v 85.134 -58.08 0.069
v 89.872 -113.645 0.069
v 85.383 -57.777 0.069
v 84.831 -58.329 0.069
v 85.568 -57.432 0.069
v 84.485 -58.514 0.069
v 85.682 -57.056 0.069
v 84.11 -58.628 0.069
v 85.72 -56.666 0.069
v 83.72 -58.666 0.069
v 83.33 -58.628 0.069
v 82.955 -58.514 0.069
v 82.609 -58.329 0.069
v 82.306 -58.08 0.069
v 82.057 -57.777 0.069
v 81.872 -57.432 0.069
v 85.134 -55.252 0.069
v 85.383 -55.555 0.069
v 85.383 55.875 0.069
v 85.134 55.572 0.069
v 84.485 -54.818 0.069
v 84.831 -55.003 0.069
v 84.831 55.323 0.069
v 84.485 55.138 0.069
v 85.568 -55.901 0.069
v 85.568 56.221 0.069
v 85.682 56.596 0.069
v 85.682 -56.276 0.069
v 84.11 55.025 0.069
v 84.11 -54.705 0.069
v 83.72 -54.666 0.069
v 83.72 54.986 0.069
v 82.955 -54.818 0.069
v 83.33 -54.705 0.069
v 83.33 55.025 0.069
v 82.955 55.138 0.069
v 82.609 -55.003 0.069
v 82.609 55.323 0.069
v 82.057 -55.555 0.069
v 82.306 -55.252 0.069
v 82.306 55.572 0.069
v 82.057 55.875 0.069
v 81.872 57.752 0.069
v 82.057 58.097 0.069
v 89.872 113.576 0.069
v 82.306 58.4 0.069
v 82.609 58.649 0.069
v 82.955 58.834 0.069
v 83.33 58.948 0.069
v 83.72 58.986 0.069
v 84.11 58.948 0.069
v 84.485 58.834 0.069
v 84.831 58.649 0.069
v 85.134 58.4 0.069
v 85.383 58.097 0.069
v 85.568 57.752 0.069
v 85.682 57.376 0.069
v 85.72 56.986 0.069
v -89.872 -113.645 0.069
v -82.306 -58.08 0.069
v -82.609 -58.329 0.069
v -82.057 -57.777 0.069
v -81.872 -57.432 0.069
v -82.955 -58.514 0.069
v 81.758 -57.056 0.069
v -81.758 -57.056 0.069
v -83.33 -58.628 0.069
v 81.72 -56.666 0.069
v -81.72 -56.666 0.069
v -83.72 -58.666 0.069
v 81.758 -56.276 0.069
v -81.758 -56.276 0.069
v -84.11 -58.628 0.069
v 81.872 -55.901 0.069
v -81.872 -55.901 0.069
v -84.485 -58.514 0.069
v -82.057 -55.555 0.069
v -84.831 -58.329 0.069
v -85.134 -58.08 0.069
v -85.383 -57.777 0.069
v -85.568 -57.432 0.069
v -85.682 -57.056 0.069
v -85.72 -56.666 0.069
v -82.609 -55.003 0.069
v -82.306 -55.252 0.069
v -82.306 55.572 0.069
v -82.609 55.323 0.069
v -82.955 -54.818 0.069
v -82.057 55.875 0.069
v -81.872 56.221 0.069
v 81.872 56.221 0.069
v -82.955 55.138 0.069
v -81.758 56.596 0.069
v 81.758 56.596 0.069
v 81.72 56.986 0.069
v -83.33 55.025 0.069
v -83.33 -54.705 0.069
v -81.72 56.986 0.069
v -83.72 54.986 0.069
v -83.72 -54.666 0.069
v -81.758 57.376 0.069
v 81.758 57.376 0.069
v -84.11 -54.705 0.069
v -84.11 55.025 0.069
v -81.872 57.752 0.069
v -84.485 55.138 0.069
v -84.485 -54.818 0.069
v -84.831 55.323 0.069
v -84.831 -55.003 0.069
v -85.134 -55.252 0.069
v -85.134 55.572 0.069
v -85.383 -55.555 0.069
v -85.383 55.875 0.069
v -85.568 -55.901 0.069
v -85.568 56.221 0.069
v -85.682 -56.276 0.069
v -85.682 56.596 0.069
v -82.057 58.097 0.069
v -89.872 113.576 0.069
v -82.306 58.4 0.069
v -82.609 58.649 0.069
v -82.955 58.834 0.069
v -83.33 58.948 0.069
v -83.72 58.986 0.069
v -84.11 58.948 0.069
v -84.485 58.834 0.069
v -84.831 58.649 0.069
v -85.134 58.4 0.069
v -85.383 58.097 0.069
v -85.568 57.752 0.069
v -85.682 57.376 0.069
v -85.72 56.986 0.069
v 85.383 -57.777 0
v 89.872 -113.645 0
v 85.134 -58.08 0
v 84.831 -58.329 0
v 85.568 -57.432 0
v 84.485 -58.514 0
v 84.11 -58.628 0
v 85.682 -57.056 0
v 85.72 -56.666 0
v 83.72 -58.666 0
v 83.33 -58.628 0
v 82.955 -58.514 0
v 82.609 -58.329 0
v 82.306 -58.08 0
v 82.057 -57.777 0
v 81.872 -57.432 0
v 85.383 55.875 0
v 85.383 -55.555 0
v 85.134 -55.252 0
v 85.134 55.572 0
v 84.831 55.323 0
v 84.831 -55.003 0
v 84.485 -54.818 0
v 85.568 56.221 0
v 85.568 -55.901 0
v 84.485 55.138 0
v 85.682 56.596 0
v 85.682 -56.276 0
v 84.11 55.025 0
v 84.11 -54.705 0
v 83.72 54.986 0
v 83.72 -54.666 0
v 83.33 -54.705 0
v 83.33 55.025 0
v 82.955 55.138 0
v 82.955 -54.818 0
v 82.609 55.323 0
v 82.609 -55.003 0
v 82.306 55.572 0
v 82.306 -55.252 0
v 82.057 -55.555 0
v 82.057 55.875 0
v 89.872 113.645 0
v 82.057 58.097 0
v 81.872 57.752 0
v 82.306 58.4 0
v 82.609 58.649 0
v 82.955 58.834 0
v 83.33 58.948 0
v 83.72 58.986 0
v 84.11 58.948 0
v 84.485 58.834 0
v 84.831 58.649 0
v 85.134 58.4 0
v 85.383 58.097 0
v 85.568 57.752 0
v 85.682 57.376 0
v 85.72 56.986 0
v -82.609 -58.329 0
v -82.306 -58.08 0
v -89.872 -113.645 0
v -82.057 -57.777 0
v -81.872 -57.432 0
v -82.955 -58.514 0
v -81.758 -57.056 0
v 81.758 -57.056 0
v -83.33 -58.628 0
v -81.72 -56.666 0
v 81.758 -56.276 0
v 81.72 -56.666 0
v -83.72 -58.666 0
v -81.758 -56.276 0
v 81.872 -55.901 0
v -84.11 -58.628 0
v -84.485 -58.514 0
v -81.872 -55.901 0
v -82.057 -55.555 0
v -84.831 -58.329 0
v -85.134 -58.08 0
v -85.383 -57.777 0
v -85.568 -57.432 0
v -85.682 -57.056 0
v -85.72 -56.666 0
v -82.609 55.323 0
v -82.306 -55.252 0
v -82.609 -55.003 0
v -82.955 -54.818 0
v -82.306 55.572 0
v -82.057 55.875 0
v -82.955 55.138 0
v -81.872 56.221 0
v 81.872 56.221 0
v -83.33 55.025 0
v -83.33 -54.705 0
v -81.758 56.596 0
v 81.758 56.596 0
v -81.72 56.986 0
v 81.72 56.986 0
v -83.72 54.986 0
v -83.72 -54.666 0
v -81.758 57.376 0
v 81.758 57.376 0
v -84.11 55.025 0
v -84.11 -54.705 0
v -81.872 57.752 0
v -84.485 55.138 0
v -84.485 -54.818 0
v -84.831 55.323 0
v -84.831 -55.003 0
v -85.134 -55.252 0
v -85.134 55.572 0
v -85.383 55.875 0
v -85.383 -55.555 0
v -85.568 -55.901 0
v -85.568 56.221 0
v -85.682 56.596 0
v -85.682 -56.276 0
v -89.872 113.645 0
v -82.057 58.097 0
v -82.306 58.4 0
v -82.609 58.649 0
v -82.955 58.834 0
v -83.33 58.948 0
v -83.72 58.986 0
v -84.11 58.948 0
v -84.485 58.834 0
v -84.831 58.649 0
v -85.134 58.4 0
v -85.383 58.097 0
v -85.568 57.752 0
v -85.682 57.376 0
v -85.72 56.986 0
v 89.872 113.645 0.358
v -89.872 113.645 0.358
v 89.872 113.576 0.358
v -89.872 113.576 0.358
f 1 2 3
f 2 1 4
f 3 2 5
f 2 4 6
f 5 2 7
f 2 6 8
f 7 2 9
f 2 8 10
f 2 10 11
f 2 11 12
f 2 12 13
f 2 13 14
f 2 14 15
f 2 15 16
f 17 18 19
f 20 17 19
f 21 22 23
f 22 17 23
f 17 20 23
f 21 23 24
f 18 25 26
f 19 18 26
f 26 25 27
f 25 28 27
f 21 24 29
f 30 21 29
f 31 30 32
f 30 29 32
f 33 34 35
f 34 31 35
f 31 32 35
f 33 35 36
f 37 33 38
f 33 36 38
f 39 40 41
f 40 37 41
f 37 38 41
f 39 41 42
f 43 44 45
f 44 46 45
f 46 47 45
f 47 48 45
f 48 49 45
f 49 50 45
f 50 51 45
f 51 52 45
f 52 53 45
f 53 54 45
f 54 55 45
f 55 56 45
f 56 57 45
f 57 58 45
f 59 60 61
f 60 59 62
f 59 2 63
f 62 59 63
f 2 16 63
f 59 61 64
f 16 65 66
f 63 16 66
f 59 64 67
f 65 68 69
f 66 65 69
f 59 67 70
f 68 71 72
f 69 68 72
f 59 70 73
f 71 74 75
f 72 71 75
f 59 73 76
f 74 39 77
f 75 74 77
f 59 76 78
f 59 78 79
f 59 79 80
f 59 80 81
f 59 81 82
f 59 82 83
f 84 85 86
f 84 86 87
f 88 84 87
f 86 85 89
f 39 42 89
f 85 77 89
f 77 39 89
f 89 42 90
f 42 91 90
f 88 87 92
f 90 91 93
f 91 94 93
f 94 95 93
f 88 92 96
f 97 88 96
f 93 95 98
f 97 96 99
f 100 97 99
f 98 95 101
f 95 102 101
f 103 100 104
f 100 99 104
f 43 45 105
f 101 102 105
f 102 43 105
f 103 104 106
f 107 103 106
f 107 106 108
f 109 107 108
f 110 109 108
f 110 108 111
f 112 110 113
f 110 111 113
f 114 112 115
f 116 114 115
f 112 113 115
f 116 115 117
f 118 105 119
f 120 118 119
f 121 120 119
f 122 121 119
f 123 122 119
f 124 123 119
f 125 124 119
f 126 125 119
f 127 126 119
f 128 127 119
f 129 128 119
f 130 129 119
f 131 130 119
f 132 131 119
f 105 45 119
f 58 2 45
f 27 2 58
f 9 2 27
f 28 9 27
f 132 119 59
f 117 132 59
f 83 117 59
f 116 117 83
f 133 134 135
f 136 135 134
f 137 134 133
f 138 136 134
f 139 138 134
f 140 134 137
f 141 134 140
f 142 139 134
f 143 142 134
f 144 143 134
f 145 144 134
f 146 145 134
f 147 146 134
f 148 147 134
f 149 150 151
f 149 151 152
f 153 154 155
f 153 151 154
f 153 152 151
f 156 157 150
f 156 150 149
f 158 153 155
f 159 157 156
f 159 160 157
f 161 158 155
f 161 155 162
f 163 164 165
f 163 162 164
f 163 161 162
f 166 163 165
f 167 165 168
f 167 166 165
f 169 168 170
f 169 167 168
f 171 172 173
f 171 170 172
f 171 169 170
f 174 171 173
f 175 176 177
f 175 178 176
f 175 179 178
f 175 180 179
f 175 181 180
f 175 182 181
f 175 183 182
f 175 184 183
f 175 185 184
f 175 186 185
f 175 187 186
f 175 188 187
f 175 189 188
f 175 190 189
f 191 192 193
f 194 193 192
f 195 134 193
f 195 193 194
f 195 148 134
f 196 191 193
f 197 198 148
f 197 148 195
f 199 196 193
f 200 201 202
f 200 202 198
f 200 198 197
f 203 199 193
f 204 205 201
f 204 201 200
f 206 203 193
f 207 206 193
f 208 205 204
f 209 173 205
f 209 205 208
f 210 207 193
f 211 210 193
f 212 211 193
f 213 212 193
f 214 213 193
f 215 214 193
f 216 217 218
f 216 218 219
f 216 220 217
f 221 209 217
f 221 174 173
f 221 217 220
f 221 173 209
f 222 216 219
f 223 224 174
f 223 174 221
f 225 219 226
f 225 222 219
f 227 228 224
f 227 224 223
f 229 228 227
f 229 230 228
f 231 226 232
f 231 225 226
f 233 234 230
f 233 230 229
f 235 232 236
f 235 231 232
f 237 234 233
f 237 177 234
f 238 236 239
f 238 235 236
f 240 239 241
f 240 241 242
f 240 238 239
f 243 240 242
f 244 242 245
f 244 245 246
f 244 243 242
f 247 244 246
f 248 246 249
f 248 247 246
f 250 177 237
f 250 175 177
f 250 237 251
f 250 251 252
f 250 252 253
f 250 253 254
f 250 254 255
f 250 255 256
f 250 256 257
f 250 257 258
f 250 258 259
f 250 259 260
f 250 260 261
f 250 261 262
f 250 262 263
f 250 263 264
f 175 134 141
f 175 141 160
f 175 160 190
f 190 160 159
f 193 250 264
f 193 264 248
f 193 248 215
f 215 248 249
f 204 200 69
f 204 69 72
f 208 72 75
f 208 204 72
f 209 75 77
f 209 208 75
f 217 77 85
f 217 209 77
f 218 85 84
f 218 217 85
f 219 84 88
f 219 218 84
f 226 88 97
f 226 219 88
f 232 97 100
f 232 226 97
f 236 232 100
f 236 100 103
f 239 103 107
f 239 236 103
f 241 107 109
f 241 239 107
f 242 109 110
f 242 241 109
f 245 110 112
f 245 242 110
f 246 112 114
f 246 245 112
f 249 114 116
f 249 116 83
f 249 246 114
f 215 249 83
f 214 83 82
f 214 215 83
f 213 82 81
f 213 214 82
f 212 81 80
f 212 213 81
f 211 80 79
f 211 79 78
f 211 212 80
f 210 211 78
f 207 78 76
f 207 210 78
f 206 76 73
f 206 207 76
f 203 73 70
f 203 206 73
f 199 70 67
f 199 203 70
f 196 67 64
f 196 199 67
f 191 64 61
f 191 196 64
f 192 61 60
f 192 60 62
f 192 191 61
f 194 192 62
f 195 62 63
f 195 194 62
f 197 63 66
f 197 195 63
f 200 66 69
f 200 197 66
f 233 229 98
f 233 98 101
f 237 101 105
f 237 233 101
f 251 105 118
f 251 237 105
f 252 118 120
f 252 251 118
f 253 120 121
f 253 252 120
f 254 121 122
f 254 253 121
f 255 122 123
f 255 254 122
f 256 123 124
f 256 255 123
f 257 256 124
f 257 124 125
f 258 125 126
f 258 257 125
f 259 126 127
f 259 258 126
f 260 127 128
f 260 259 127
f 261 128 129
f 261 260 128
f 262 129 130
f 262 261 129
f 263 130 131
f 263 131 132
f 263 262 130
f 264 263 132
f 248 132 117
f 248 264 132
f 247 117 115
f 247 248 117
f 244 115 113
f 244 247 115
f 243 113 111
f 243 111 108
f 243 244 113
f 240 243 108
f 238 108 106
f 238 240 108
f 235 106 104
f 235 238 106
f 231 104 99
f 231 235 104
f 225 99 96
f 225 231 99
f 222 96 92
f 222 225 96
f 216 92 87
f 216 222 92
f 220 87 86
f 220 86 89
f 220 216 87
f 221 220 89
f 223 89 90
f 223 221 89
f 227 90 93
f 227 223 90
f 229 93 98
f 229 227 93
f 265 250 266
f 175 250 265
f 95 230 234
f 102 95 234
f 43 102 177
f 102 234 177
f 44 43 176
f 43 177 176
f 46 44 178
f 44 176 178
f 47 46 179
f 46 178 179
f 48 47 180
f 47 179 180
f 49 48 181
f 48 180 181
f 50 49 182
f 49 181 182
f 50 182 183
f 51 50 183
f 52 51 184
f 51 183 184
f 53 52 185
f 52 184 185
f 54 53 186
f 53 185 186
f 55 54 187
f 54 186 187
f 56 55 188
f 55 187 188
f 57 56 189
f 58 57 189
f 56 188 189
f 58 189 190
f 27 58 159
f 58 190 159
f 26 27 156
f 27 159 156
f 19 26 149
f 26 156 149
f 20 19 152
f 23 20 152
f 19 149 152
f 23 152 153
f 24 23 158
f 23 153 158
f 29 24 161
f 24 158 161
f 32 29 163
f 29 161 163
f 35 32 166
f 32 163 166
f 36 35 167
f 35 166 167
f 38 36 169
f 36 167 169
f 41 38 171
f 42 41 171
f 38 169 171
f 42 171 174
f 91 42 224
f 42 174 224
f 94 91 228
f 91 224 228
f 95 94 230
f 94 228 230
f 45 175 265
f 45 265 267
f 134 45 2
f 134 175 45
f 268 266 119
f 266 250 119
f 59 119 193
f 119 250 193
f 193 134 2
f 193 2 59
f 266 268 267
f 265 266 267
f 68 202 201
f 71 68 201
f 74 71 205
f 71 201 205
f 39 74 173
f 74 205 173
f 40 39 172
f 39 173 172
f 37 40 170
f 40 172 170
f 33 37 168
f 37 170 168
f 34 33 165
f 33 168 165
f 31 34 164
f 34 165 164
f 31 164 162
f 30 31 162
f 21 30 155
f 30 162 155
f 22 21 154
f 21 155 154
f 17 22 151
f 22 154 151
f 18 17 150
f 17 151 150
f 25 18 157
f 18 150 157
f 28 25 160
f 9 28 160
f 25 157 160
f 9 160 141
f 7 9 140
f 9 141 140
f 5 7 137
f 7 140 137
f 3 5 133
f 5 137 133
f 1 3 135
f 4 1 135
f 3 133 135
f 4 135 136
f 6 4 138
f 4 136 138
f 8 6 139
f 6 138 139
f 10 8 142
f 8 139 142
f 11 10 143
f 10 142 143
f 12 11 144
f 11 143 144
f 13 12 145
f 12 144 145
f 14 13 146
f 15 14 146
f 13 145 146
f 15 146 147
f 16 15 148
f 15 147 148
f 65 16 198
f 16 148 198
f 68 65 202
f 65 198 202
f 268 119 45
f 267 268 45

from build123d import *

# Parameters (mm, degrees)
SKETCH1_W          = 89.8724
SKETCH1_H          = 227.2896
SKETCH1_R          = 2
BODY_DEPTH         = 0.06858
SKETCH2_W          = 89.8724
SKETCH2_H          = 0.0686
TOP_OVERWRAP_DEPTH = 0.2896


with BuildPart() as part:
    # Sketch1 → Body (new body)
    with BuildSketch(Plane.XY):
        with Locations((-44.9362, 0)):
            Rectangle(SKETCH1_W, SKETCH1_H)
        with Locations((-83.71996894, -56.66618171)):
            Circle(SKETCH1_R, mode=Mode.SUBTRACT)
        with Locations((-83.71996894, 56.98616943)):
            Circle(SKETCH1_R, mode=Mode.SUBTRACT)
    body = extrude(amount=BODY_DEPTH)

    # Sketch2 → Top Overwrap (add)
    with BuildSketch(Plane(origin=(0, 227.3734, 0.06858), x_dir=(-1, 0, 0), z_dir=(0, 0, 1))):
        with Locations((44.9362, 113.7629)):
            Rectangle(SKETCH2_W, SKETCH2_H)
    top_overwrap = extrude(amount=TOP_OVERWRAP_DEPTH)

    # Mirror1: Body, Top Overwrap across plane
    add(body.mirror(Plane(origin=(0, 0, 0), x_dir=(0, 0, 1), z_dir=(1, 0, 0))))
    add(top_overwrap.mirror(Plane(origin=(0, 0, 0), x_dir=(0, 0, 1), z_dir=(1, 0, 0))))


solid = part.part
